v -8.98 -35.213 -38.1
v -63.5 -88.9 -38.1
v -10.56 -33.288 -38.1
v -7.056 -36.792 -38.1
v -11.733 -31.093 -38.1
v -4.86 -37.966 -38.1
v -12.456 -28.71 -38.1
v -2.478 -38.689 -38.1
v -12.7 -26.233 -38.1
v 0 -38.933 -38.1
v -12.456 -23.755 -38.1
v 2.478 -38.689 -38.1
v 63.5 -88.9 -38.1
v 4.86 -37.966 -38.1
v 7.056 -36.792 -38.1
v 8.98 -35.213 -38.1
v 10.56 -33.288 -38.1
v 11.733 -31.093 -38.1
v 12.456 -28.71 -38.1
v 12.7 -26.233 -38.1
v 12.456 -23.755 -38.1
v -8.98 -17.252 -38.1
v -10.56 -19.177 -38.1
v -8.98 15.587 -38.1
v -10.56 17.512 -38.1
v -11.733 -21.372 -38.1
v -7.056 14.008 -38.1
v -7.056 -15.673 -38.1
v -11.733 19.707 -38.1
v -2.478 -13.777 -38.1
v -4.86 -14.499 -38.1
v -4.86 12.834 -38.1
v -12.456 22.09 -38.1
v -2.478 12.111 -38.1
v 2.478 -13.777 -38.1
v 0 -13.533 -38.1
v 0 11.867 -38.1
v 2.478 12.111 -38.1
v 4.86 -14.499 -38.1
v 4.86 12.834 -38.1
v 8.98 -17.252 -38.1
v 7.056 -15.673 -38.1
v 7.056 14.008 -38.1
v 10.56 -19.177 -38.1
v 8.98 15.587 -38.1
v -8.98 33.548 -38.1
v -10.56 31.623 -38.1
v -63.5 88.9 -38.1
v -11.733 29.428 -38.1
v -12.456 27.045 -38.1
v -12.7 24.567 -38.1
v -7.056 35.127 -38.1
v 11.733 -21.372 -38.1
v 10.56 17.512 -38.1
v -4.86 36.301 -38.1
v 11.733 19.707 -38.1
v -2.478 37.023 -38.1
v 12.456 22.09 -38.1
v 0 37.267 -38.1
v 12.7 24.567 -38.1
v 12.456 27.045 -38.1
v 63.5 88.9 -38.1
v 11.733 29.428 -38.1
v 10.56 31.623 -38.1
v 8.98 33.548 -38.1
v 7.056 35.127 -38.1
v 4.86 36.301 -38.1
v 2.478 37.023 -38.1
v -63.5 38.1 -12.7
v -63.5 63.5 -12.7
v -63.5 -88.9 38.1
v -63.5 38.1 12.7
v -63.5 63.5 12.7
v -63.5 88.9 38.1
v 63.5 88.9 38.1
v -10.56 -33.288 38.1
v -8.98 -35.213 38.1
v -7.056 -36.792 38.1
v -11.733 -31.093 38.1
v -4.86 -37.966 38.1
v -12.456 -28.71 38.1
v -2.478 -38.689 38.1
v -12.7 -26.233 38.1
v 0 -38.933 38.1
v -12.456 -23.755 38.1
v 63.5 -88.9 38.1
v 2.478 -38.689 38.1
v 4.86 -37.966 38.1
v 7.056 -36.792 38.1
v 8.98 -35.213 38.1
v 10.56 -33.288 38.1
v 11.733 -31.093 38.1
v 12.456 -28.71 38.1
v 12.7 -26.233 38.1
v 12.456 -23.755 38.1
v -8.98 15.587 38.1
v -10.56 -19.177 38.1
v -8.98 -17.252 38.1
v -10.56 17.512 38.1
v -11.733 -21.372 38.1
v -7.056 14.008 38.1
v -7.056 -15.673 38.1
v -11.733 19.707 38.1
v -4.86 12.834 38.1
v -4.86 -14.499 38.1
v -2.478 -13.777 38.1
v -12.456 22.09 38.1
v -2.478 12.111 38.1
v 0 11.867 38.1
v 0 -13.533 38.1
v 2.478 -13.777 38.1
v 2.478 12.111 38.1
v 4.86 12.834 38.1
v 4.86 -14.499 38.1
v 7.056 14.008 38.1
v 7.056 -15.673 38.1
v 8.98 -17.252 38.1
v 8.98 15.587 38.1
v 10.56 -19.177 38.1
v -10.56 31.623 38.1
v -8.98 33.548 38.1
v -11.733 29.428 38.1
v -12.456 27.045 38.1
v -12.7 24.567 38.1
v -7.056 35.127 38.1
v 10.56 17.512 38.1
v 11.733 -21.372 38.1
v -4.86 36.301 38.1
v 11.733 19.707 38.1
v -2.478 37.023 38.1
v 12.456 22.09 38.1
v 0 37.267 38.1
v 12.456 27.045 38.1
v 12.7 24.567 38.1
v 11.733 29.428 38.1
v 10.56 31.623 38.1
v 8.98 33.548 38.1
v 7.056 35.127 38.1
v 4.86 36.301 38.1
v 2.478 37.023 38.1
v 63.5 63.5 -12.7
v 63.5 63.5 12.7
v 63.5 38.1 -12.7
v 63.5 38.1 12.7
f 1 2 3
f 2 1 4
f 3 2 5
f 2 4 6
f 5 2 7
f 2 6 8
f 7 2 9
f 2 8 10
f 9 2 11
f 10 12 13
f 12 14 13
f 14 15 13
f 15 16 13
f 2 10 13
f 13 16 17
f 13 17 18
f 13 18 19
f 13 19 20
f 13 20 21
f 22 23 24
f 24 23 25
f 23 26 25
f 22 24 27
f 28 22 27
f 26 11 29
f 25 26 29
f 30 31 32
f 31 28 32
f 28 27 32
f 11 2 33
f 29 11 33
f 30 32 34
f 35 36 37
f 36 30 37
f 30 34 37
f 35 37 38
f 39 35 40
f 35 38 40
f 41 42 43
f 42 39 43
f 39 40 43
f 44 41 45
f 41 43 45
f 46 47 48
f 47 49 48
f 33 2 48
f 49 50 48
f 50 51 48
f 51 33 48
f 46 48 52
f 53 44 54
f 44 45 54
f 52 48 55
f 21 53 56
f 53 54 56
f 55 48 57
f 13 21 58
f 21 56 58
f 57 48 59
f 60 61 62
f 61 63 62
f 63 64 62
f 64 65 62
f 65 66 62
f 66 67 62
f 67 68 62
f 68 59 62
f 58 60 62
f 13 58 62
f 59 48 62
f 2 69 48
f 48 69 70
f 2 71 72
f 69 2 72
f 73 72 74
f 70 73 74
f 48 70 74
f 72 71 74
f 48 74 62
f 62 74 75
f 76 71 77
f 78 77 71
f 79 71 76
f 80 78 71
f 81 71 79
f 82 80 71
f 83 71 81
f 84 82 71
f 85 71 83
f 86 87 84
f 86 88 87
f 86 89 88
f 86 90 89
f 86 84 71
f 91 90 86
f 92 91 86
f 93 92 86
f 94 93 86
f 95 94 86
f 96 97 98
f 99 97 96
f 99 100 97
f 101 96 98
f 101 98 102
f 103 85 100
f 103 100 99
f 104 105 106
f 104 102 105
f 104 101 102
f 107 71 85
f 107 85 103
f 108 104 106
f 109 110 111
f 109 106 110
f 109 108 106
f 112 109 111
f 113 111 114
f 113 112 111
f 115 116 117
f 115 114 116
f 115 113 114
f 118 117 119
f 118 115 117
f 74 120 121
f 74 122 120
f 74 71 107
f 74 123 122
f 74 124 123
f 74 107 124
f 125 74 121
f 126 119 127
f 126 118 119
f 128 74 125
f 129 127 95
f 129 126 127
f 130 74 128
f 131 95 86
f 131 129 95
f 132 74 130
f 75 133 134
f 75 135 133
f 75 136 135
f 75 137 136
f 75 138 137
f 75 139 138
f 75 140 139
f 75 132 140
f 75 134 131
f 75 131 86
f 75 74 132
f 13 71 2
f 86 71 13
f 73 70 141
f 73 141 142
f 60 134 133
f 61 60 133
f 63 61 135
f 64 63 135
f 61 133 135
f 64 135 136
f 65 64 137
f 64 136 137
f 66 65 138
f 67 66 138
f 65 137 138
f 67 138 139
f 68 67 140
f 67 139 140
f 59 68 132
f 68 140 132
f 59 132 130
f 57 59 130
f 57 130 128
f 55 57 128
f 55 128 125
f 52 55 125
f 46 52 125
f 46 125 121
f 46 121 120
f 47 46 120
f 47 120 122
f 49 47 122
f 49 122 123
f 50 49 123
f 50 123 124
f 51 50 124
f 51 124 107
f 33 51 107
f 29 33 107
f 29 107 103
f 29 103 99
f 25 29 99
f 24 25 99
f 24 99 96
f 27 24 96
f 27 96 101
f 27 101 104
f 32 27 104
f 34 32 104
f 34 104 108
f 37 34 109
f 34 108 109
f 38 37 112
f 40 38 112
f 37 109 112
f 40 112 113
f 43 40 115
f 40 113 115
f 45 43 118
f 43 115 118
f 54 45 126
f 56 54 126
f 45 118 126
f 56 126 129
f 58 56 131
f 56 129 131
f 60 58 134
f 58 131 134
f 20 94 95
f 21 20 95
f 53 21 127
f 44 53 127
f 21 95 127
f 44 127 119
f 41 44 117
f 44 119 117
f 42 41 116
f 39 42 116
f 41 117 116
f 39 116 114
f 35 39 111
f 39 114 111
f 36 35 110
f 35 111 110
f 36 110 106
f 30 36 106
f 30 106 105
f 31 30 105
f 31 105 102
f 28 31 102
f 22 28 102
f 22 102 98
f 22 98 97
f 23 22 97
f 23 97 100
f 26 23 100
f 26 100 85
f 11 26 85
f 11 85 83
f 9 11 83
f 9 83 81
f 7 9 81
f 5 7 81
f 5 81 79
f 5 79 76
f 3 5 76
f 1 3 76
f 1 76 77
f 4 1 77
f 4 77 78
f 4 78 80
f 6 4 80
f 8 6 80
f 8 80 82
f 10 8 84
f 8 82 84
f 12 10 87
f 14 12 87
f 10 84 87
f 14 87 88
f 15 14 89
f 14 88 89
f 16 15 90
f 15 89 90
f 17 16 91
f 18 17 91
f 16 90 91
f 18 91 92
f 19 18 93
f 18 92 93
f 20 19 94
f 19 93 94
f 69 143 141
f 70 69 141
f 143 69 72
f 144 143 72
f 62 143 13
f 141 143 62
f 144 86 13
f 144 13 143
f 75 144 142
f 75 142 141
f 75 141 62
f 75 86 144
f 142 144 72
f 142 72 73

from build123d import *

# Parameters (mm, degrees)
F0_W     = 127
F0_H     = 177.8
F1_DEPTH = 38.1
F2_R     = 12.7
F3_DEPTH = 76.201
F4_W     = 25.4
F4_H     = 25.4
F5_DEPTH = 127.001


with BuildPart() as f1:
    # F0 (on Top) → F1 (new body, symmetric)
    with BuildSketch(Plane.XY):
        Rectangle(F0_W, F0_H)
    extrude(amount=F1_DEPTH, both=True)

    # F2 (on face) → F3 (cut, through all)
    with BuildSketch(Plane.XY.offset(38.1)):
        with Locations((0, 24.567431)):
            Circle(F2_R)
        with Locations((0, -26.232569)):
            Circle(F2_R)
    extrude(amount=-F3_DEPTH, mode=Mode.SUBTRACT)

    # F4 (on face) → F5 (cut, through all)
    with BuildSketch(Plane.YZ.offset(63.5)):
        with Locations((50.8, 0)):
            Rectangle(F4_W, F4_H)
    extrude(amount=-F5_DEPTH, mode=Mode.SUBTRACT)


solid = f1.part
